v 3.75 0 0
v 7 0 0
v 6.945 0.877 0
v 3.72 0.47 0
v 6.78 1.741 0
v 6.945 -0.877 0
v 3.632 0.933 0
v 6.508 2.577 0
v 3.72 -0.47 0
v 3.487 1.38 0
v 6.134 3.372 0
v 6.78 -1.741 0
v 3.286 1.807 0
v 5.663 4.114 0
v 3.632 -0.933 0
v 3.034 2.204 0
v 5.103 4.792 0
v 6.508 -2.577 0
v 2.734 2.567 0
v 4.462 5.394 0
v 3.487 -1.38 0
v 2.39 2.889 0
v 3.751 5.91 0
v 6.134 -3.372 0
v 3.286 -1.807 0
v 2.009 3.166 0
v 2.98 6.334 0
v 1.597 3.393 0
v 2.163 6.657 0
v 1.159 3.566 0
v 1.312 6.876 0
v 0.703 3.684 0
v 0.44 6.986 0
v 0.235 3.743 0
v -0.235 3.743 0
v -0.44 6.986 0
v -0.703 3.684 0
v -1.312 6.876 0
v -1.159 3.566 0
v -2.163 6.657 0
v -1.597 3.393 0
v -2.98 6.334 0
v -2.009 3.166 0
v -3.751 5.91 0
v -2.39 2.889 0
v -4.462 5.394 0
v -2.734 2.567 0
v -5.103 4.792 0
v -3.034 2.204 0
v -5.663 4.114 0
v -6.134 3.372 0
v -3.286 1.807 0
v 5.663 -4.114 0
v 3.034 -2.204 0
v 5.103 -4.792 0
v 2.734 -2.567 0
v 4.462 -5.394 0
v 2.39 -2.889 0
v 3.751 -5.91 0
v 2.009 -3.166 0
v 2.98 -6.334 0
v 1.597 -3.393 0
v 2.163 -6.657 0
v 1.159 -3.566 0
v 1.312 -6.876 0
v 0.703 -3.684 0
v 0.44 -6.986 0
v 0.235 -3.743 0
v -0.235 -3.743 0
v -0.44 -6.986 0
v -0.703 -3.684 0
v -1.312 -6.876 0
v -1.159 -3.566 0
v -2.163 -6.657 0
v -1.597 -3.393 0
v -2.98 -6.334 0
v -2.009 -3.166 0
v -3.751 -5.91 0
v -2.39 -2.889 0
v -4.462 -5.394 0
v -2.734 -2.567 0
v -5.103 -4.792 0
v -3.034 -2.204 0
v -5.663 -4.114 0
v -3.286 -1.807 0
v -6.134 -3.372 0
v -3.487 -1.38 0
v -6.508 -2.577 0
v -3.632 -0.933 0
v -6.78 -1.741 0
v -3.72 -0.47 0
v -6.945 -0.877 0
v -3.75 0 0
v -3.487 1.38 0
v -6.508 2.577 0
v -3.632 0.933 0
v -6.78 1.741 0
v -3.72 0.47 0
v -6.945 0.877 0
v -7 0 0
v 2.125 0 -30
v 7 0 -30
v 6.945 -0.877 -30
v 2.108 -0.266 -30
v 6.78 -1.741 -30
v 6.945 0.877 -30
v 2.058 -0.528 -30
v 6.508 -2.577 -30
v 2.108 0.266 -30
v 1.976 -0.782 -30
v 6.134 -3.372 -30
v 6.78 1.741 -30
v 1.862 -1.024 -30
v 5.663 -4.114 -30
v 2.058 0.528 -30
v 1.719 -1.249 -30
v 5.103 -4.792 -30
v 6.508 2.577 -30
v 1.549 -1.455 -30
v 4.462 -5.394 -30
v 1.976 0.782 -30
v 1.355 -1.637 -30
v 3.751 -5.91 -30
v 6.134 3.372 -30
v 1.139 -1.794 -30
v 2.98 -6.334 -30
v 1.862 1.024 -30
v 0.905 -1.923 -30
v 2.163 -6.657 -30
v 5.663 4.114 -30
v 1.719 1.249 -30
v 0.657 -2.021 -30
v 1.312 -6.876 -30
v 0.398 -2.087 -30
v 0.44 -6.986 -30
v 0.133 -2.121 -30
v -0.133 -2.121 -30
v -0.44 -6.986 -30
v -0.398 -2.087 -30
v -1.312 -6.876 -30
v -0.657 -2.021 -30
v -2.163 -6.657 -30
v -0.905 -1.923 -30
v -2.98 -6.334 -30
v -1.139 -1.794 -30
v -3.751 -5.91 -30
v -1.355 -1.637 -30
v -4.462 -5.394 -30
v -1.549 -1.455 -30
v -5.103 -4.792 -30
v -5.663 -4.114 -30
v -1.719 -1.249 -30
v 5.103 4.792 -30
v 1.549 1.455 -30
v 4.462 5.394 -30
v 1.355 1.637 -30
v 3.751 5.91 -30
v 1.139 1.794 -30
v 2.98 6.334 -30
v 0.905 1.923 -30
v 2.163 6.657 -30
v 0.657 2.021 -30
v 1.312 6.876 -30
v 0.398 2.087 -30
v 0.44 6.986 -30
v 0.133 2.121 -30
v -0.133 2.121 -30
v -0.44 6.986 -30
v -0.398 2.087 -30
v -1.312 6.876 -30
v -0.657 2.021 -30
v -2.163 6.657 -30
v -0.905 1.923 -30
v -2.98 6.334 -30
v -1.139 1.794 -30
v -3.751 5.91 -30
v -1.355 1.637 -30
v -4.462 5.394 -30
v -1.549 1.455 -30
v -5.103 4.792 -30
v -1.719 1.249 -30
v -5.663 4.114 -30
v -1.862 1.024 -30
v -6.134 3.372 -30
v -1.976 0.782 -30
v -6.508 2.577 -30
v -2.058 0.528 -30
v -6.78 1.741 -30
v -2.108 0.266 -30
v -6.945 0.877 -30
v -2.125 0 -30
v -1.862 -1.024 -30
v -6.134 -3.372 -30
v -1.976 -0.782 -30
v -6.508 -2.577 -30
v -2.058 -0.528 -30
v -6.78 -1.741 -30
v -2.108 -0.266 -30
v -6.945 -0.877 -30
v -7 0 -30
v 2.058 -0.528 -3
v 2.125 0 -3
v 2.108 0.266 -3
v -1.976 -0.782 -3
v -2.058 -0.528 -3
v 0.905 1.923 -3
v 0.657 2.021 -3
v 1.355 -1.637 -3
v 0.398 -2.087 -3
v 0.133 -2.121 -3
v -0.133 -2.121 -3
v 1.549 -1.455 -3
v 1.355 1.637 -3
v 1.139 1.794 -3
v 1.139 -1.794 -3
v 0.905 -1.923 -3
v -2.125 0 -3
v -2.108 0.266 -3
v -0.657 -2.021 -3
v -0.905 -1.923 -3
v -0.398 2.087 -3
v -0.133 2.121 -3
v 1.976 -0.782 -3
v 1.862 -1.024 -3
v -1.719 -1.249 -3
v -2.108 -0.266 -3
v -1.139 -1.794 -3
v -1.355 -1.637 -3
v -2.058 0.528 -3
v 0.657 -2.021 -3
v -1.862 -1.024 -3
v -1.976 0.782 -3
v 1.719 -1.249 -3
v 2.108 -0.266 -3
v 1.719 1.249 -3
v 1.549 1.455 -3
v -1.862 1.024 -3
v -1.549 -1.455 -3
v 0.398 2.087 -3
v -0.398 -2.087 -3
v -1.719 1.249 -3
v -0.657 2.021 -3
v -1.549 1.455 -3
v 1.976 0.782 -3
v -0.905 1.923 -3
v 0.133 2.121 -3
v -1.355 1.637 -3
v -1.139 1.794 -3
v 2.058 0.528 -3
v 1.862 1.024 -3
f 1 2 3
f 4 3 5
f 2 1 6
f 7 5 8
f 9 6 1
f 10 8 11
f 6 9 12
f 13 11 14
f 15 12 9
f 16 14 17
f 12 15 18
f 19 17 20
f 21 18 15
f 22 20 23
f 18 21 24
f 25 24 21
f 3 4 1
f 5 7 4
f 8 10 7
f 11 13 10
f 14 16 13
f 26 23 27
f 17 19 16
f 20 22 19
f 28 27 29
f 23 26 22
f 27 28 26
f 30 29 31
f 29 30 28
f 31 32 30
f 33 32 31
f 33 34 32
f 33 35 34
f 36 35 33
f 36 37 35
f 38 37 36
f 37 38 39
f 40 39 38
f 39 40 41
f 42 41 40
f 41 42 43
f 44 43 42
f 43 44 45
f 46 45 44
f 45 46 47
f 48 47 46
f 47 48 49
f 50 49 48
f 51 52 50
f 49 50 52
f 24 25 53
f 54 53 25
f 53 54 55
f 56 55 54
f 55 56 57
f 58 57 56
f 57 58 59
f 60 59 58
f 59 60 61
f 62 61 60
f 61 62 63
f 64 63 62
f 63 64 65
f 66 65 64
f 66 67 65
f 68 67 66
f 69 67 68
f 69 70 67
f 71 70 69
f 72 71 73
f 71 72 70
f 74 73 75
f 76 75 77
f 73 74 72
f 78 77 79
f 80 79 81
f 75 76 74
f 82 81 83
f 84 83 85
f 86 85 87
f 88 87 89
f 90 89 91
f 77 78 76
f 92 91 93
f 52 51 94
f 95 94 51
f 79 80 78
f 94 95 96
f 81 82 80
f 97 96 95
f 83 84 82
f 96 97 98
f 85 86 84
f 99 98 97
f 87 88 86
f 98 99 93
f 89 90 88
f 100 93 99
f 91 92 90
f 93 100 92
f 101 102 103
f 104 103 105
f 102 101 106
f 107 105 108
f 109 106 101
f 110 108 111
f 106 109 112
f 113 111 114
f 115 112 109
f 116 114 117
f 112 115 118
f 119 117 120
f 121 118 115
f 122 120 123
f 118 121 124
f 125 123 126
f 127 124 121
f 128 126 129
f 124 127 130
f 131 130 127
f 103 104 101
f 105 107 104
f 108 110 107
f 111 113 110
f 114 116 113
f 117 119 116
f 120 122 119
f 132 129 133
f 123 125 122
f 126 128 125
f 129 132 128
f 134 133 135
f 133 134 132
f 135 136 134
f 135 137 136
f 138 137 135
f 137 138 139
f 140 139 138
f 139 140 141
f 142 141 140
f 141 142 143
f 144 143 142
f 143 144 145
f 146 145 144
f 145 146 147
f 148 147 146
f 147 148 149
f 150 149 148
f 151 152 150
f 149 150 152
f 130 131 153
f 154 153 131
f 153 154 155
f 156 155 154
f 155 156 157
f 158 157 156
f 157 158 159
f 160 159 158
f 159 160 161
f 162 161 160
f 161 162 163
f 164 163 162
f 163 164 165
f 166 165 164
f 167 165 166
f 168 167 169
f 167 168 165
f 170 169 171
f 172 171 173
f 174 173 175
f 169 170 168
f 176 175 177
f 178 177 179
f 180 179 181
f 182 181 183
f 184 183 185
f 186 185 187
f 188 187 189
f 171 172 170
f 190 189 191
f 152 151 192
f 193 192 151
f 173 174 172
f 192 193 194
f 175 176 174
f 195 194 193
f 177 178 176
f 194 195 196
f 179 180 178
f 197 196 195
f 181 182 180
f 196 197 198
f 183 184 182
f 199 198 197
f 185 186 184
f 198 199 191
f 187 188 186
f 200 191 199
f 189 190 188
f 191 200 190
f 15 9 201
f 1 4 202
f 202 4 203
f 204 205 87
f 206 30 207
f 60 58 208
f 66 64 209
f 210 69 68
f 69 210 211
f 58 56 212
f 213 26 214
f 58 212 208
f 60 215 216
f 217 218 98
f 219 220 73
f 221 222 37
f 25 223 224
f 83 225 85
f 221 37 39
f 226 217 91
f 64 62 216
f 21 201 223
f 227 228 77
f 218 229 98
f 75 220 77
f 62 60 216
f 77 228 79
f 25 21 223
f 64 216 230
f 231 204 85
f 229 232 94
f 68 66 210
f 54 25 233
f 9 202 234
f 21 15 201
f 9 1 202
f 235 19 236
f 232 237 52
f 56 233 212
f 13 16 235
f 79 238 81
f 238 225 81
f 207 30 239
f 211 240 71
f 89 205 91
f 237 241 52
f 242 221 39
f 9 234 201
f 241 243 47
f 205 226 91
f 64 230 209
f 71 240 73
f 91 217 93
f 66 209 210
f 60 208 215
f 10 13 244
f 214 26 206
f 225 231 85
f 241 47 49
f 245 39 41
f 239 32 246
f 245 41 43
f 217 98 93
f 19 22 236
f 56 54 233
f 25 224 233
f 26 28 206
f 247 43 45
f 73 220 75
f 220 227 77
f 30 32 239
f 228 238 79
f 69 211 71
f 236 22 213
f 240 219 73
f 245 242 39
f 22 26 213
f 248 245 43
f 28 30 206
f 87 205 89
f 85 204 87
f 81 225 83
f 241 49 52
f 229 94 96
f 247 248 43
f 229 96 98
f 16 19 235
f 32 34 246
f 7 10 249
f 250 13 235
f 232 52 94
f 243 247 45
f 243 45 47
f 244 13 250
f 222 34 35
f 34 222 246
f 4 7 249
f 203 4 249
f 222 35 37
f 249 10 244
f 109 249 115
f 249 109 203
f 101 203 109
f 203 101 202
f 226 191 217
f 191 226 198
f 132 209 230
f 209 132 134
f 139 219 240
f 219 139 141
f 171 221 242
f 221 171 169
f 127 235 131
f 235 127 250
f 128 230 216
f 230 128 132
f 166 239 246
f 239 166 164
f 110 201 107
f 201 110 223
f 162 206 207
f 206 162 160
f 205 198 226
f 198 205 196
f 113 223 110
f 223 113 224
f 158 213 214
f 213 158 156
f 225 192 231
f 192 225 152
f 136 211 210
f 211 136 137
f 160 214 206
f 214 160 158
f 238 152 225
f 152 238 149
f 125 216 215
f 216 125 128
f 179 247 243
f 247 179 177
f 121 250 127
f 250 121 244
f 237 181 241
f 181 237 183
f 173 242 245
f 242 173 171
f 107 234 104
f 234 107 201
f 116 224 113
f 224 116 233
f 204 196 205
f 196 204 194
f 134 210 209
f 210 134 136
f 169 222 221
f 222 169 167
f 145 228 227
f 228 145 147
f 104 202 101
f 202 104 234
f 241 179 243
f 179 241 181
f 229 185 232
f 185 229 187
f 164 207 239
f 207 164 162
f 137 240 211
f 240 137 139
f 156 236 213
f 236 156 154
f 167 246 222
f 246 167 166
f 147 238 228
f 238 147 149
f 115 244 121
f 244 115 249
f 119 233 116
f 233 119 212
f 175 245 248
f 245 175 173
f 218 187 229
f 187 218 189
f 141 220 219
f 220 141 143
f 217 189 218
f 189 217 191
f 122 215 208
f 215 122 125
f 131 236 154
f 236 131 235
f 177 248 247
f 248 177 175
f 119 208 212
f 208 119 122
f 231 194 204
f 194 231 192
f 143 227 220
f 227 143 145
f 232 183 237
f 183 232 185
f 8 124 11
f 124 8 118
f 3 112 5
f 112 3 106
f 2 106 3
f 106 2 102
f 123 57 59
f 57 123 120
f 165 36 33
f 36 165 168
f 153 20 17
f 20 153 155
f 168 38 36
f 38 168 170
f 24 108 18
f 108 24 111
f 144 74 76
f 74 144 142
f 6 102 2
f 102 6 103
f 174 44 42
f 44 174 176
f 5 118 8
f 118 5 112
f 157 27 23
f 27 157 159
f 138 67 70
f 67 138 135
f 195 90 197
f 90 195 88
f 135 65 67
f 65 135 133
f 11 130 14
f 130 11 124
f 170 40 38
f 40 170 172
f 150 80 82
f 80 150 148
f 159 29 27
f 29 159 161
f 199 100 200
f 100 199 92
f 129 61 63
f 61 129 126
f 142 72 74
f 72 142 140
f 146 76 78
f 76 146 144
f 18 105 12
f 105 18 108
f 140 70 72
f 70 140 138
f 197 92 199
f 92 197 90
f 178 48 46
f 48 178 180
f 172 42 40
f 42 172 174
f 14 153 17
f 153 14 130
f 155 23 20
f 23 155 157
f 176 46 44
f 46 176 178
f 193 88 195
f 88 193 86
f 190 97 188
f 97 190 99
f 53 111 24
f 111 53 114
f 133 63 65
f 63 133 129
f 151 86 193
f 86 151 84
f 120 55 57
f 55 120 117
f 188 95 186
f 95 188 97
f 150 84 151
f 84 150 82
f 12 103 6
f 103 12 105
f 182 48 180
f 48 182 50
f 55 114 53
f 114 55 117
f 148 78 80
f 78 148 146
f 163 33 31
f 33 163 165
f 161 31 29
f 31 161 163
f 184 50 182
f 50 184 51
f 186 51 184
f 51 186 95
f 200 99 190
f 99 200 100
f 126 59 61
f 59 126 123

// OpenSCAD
$fn = 50;


difference() {
	union() {
		translate(v = [0, 0, -30.0000000000]) {
			cylinder(h = 30, r = 7.0000000000);
		}
		cylinder(h = 0, r = 13.0000000000);
	}
	union() {
		translate(v = [0, 0, 0]) {
			rotate(a = [0, 0, 0]) {
				difference() {
					union() {
						#translate(v = [0, 0, -30.0000000000]) {
							cylinder(h = 30, r = 2.0000000000);
						}
						#translate(v = [0, 0, -3]) {
							cylinder(h = 3, r = 7.0000000000, r1 = 2.1250000000, r2 = 3.7500000000);
						}
						#translate(v = [0, 0, -30.0000000000]) {
							cylinder(h = 30, r = 2.1250000000);
						}
						#translate(v = [0, 0, -30.0000000000]) {
							cylinder(h = 30, r = 2.0000000000);
						}
					}
					union();
				}
			}
		}
	}
}
